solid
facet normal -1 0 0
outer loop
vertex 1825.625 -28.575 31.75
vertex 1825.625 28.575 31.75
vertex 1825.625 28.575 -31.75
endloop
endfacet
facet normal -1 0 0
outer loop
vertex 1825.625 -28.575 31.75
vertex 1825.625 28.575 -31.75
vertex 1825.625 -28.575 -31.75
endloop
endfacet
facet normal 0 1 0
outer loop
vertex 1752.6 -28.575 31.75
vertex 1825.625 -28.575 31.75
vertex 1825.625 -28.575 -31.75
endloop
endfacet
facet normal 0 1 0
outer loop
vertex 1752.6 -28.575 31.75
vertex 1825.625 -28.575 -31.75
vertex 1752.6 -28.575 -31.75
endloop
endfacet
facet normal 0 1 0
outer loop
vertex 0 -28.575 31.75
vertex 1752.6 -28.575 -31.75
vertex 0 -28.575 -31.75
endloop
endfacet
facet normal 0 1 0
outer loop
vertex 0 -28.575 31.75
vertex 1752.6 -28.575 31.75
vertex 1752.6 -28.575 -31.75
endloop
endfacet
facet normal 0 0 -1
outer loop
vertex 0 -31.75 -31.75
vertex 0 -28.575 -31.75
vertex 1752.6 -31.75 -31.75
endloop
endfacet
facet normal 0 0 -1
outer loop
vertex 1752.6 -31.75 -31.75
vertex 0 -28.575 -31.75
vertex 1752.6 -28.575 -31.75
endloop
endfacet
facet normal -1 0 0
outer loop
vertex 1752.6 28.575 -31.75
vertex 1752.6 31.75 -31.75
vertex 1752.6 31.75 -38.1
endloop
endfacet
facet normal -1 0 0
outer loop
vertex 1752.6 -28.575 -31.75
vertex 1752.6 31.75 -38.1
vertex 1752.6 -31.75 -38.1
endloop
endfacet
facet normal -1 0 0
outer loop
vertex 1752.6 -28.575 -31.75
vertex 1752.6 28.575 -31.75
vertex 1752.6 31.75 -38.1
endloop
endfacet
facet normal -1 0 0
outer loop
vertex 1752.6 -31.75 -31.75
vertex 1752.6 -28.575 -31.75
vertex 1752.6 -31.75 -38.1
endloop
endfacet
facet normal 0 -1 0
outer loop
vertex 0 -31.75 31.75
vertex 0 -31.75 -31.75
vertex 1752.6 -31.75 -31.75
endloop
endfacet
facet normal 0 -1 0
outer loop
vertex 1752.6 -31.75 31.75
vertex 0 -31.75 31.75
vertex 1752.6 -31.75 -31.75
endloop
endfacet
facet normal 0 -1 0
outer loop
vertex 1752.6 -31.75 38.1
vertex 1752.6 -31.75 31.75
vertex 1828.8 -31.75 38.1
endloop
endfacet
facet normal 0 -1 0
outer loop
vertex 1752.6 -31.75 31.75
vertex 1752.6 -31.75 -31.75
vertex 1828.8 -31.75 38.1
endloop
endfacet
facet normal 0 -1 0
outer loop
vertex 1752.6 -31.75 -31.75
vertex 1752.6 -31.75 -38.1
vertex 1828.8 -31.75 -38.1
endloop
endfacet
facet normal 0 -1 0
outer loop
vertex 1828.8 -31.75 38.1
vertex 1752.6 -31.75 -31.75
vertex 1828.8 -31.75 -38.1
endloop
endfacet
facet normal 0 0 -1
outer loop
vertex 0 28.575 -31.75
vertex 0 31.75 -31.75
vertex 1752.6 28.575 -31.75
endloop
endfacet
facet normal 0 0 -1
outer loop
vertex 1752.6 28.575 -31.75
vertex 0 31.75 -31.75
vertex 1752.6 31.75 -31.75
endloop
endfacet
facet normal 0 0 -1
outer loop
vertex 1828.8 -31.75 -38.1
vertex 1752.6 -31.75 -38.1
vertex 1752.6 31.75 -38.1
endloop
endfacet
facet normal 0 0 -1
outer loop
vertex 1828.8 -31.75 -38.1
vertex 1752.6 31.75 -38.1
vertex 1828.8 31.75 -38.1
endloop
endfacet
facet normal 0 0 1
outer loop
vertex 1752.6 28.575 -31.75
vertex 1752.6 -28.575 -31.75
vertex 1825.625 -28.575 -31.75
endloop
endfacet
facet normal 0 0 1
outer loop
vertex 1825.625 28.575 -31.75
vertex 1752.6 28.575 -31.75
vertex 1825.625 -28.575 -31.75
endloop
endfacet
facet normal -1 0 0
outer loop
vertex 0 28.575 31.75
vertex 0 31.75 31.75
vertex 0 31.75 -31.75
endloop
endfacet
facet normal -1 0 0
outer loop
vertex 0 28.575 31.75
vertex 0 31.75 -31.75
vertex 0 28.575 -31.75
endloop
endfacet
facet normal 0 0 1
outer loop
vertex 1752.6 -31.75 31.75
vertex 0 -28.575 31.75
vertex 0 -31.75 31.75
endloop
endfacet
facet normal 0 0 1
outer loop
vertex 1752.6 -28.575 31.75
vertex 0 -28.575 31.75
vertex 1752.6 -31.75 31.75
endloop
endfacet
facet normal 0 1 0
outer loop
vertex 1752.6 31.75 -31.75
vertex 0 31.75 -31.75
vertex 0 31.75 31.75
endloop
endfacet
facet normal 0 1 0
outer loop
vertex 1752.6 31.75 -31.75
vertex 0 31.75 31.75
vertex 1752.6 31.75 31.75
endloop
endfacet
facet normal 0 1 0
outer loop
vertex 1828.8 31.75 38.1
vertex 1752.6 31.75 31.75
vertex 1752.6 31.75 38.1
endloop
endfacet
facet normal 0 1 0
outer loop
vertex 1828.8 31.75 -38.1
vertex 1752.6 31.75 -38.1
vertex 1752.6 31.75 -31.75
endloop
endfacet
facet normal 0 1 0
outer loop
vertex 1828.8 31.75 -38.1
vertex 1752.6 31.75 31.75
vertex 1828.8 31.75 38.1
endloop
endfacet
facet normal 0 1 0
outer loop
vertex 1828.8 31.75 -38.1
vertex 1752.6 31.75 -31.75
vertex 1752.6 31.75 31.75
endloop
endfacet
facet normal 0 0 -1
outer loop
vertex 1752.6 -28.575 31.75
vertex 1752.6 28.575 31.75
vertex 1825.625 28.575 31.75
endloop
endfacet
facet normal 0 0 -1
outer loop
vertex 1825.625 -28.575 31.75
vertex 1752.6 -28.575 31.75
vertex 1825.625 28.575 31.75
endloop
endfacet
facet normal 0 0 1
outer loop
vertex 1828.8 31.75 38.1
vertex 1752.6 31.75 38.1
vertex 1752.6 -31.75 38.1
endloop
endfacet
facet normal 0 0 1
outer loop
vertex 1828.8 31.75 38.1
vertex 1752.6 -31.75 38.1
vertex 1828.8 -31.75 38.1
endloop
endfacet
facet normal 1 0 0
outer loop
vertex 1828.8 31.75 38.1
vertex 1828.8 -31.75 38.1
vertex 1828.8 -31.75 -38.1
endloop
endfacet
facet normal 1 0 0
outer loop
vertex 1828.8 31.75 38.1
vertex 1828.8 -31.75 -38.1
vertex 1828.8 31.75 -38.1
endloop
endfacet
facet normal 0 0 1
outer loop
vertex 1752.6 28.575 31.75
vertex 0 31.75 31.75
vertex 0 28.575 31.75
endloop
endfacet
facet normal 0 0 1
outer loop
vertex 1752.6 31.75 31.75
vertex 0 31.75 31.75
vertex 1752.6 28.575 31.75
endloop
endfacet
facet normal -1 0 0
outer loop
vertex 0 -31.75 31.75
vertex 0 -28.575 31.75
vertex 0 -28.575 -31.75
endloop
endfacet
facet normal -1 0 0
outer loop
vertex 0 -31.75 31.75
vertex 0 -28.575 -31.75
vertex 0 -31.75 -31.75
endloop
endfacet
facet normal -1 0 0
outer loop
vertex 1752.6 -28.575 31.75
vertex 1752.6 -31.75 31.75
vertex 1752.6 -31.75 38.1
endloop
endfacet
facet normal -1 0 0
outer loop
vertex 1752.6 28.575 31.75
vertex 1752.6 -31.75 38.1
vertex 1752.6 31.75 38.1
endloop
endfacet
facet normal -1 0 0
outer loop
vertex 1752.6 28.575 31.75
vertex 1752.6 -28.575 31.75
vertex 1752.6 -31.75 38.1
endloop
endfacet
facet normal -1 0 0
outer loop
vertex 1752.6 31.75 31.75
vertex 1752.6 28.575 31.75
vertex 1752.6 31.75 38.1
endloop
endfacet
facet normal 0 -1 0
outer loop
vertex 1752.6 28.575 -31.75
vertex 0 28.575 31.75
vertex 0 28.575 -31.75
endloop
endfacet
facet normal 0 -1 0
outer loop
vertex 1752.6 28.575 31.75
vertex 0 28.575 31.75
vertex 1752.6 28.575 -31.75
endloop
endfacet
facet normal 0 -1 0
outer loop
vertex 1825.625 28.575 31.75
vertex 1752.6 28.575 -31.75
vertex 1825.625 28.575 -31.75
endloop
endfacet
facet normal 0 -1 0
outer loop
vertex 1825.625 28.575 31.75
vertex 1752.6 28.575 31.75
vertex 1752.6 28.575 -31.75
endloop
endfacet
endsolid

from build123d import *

# Parameters (mm, degrees)
F1_DEPTH = 31.75
F2_W     = 76.2
F2_H     = 63.5
F3_DEPTH = 6.35
F4_W     = 76.2
F4_H     = 63.5
F5_DEPTH = 6.35


with BuildPart() as f1:
    # F0 (on Top) → F1 (new body, symmetric)
    with BuildSketch(Plane.XY):
        Polygon((1828.8, 31.75), (0, 31.75), (0, 28.575), (1825.625, 28.575), (1825.625, -28.575), (0, -28.575), (0, -31.75), (1828.8, -31.75), align=None)
    extrude(amount=F1_DEPTH, both=True)

    # F2 (on face) → F3 (join)
    with BuildSketch(Plane(origin=(0, 0, -31.75), x_dir=(1, 0, 0), z_dir=(0, 0, -1))):
        with Locations((1790.7, 0)):
            Rectangle(F2_W, F2_H)
    extrude(amount=F3_DEPTH)

    # F4 (on face) → F5 (join)
    with BuildSketch(Plane.XY.offset(31.75)):
        with Locations((1790.7, 0)):
            Rectangle(F4_W, F4_H)
    extrude(amount=F5_DEPTH)


solid = f1.part
